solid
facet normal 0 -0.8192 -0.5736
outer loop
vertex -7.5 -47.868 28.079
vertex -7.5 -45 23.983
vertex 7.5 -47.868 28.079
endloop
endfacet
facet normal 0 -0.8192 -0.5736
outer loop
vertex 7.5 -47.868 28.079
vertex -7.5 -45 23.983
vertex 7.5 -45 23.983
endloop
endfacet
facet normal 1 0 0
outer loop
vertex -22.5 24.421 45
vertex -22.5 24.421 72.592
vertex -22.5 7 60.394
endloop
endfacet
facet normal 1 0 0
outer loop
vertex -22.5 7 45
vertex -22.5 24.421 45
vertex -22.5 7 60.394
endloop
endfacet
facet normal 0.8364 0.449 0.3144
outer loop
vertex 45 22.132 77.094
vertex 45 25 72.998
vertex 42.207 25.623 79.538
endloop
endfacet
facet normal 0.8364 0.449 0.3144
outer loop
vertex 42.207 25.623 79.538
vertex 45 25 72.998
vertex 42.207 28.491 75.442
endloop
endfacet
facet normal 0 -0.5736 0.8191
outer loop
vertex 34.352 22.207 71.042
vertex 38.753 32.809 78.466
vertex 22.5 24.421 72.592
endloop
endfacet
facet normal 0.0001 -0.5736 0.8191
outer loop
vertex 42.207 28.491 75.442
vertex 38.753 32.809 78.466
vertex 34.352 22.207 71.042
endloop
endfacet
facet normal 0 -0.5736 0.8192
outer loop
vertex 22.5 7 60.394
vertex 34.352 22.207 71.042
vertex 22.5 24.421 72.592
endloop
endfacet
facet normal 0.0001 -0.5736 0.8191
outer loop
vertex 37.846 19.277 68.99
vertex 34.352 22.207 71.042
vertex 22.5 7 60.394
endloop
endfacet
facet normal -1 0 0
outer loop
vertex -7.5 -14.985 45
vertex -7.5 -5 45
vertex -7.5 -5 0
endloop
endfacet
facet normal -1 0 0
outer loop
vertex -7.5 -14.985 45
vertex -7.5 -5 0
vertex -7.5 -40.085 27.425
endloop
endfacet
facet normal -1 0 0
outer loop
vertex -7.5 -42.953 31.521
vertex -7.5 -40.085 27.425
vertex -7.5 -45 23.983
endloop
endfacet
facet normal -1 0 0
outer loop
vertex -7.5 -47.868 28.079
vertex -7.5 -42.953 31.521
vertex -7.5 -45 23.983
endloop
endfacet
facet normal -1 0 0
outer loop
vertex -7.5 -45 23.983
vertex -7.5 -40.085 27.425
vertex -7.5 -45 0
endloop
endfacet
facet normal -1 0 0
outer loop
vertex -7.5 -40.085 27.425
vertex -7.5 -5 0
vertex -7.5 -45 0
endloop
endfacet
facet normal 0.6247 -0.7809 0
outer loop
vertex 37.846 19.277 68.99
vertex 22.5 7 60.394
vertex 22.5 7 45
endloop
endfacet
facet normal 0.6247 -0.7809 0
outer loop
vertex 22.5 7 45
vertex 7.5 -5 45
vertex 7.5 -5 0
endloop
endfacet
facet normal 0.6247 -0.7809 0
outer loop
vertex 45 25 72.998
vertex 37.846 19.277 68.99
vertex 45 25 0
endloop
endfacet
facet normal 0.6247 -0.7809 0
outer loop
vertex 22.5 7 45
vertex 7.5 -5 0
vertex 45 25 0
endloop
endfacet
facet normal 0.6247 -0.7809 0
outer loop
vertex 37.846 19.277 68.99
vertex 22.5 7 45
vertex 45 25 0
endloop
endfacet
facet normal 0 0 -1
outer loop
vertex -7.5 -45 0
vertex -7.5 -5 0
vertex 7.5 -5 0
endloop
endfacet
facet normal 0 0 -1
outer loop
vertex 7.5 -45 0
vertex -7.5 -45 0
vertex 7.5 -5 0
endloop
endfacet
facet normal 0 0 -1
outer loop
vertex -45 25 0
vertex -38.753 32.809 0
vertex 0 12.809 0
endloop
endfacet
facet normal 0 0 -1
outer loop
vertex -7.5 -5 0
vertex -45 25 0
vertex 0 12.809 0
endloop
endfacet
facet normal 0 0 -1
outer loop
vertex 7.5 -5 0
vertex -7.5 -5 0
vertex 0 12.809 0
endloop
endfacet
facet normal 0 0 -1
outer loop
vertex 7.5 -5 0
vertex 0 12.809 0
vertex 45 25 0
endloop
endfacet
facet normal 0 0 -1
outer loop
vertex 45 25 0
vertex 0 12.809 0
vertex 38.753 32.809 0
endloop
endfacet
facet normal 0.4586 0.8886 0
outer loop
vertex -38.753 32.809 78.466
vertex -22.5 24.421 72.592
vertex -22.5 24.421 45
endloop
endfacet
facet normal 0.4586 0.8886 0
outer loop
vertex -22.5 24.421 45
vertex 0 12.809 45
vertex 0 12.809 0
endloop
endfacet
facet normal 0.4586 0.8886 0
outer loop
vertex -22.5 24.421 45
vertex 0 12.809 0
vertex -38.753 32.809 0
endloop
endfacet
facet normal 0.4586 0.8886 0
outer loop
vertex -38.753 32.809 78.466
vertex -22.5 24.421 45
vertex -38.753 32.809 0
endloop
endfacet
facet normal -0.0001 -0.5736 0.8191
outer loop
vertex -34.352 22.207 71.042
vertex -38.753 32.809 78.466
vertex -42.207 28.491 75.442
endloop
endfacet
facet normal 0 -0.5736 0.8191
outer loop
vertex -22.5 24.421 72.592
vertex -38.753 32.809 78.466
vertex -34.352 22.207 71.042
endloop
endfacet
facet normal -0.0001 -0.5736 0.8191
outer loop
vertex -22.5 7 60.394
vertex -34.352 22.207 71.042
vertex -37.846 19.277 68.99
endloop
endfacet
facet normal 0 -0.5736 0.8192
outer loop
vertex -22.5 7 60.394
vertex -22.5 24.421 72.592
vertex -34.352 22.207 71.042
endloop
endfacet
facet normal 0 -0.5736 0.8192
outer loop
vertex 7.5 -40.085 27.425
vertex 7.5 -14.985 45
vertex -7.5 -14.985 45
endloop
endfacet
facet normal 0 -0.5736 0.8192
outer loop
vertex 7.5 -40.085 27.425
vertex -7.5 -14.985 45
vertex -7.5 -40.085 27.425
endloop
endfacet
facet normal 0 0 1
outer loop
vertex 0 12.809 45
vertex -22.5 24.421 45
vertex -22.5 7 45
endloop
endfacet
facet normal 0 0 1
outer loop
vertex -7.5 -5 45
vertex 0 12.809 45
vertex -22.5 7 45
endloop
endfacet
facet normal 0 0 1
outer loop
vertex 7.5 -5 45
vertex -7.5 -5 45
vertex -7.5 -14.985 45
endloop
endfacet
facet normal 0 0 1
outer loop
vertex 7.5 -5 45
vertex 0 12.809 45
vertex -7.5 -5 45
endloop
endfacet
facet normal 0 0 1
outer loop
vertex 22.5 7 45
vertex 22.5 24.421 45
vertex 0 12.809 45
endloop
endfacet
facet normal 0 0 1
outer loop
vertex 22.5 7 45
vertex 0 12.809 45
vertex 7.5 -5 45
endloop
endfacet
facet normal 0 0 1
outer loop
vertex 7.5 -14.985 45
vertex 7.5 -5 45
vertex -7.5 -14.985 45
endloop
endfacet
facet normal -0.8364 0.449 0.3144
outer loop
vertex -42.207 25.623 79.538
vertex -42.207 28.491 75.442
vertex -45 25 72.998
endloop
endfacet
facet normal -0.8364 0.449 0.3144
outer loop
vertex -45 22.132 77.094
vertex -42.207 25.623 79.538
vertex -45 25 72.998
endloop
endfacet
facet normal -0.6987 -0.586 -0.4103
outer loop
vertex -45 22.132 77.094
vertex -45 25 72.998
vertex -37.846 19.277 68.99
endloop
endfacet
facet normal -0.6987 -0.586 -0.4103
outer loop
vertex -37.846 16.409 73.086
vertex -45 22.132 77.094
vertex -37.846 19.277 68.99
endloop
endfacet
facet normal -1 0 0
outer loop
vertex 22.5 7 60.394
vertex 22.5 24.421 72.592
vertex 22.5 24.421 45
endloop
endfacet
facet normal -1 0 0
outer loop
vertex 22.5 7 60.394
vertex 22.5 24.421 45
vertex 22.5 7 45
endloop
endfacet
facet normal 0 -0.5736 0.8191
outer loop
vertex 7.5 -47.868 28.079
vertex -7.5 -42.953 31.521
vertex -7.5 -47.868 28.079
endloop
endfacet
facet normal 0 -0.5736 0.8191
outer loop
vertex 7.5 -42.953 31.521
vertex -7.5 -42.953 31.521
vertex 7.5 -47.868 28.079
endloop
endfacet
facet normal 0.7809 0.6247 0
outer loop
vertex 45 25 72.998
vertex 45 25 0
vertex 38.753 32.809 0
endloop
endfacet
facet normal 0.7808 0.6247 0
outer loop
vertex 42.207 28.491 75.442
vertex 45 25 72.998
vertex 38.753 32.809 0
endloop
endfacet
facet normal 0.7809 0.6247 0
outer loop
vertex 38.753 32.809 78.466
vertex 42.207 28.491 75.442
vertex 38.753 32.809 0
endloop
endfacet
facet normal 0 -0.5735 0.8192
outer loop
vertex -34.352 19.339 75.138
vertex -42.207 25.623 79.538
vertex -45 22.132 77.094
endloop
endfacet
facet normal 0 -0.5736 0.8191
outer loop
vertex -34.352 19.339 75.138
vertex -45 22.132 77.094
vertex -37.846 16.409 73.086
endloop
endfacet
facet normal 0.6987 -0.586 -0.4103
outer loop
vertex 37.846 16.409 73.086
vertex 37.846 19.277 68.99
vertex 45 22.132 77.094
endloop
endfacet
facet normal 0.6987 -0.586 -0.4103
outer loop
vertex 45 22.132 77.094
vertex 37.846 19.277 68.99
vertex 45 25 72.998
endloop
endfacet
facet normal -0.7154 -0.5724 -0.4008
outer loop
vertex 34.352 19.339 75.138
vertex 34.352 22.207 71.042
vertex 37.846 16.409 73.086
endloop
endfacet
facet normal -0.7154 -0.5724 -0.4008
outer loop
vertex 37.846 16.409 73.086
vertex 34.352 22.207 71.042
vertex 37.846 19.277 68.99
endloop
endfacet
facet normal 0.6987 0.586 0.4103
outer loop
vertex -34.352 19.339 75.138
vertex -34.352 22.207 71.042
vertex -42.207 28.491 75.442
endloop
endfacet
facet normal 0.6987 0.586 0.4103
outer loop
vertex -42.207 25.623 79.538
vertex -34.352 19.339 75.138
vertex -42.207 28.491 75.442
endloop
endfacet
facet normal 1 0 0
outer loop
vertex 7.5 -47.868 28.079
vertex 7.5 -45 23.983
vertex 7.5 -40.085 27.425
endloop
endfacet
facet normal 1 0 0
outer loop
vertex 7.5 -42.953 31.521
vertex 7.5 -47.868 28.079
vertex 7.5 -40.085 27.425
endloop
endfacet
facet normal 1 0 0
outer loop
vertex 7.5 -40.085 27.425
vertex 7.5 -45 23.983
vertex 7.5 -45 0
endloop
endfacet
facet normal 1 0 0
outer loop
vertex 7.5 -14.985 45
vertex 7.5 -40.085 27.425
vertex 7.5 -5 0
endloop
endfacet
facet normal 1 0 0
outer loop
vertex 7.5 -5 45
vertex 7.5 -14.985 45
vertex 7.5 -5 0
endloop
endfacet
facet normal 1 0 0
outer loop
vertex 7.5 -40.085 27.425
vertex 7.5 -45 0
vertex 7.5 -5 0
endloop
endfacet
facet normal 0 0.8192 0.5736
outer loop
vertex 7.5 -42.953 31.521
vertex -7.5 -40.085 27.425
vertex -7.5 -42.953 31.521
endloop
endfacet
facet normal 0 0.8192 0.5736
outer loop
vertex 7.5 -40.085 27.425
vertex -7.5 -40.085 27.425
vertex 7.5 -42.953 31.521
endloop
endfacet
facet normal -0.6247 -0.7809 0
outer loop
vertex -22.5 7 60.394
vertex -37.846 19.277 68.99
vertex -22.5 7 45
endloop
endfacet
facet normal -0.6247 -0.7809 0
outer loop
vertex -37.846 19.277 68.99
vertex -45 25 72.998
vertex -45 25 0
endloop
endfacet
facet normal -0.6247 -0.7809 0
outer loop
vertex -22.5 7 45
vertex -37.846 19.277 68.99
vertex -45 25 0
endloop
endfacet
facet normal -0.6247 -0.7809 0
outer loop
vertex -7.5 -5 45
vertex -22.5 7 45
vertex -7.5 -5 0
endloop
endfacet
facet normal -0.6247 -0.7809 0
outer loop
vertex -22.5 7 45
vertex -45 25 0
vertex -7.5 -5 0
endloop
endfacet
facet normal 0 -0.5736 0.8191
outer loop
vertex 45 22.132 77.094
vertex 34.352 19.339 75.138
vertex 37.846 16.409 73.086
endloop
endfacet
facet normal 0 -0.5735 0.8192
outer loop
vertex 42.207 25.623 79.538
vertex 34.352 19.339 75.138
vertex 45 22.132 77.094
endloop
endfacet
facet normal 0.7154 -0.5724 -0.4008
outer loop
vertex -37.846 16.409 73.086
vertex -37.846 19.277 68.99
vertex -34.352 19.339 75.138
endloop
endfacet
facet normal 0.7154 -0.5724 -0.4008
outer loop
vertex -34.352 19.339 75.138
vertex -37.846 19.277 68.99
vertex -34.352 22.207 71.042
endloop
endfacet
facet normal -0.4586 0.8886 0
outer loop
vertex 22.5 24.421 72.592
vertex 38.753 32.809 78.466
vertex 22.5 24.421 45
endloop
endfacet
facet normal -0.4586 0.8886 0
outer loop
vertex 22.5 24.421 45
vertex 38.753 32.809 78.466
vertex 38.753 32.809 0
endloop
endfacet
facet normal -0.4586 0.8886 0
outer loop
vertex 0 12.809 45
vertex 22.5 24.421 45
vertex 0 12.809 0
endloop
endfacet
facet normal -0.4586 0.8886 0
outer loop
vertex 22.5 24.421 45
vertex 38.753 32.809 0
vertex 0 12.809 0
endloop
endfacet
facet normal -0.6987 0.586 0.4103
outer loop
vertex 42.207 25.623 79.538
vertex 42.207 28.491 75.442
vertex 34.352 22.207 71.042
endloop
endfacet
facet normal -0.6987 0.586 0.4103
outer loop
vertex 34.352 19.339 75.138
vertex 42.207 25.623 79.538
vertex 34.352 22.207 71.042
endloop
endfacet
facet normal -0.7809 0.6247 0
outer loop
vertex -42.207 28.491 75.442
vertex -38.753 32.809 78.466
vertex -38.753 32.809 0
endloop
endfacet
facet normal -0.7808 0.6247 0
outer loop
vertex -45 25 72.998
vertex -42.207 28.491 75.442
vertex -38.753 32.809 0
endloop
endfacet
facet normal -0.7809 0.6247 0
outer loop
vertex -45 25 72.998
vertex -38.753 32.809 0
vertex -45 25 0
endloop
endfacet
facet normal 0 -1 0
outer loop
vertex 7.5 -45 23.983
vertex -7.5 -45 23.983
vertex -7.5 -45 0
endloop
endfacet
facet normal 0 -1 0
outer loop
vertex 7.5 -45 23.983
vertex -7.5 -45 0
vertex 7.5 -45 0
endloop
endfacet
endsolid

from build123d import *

# Parameters (mm, degrees)
F1_DEPTH      = 80
F3_DEPTH      = 37.501
F3_DEPTH_BACK = 52.501
F4_W          = 15
F4_H          = 6
F5_DEPTH      = 5
F7_DEPTH      = 30
F7_DEPTH_BACK = 15


with BuildPart() as f1:
    # F0 (on Top) → F1 (new body)
    with BuildSketch(Plane.XY):
        Polygon((-38.7530495245, 32.8086880944), (-45, 25), (-7.5, -5), (-7.5, -45), (7.5, -45), (7.5, -5), (45, 25), (38.7530495245, 32.8086880944), (0, 12.8086880944), align=None)
    extrude(amount=F1_DEPTH)

    # F2 (on face) → F3 (cut, two sides)
    with BuildSketch(Plane(origin=(-7.5, 0, 0), x_dir=(0, -1, 0), z_dir=(-1, 0, 0))) as f3_sk:
        Polygon((45, 23.9833969432), (45, 80), (-35, 80), align=None)
    extrude(amount=F3_DEPTH, mode=Mode.SUBTRACT)
    extrude(f3_sk.sketch, amount=-F3_DEPTH_BACK, mode=Mode.SUBTRACT)

    # F4 (on face) → F5 (join)
    with BuildSketch(Plane(origin=(0, -26.0730573396, 37.2361848693), x_dir=(1, 0, 0), z_dir=(0, -0.5735764364, 0.8191520443))):
        Polygon((-42.207332973, 66.6102117473), (-45, 62.3486905706), (-37.8457929426, 55.3617512278), (-34.3523232712, 58.9388547565), align=None)
        Polygon((37.8457929426, 55.3617512278), (45, 62.3486905706), (42.207332973, 66.6102117473), (34.3523232712, 58.9388547565), align=None)
        with Locations((0, -20.1055306427)):
            Rectangle(F4_W, F4_H)
    extrude(amount=F5_DEPTH)

    # F6 (on face) → F7 (cut, two sides)
    with BuildSketch(Plane(origin=(-7.5, 0, 0), x_dir=(0, -1, 0), z_dir=(-1, 0, 0))) as f7_sk:
        Polygon((-25.014819764, 45), (14.985180236, 45), (-25.014819764, 73.0083015284), align=None)
    extrude(amount=-F7_DEPTH, mode=Mode.SUBTRACT)
    extrude(f7_sk.sketch, amount=F7_DEPTH_BACK, mode=Mode.SUBTRACT)


solid = f1.part
